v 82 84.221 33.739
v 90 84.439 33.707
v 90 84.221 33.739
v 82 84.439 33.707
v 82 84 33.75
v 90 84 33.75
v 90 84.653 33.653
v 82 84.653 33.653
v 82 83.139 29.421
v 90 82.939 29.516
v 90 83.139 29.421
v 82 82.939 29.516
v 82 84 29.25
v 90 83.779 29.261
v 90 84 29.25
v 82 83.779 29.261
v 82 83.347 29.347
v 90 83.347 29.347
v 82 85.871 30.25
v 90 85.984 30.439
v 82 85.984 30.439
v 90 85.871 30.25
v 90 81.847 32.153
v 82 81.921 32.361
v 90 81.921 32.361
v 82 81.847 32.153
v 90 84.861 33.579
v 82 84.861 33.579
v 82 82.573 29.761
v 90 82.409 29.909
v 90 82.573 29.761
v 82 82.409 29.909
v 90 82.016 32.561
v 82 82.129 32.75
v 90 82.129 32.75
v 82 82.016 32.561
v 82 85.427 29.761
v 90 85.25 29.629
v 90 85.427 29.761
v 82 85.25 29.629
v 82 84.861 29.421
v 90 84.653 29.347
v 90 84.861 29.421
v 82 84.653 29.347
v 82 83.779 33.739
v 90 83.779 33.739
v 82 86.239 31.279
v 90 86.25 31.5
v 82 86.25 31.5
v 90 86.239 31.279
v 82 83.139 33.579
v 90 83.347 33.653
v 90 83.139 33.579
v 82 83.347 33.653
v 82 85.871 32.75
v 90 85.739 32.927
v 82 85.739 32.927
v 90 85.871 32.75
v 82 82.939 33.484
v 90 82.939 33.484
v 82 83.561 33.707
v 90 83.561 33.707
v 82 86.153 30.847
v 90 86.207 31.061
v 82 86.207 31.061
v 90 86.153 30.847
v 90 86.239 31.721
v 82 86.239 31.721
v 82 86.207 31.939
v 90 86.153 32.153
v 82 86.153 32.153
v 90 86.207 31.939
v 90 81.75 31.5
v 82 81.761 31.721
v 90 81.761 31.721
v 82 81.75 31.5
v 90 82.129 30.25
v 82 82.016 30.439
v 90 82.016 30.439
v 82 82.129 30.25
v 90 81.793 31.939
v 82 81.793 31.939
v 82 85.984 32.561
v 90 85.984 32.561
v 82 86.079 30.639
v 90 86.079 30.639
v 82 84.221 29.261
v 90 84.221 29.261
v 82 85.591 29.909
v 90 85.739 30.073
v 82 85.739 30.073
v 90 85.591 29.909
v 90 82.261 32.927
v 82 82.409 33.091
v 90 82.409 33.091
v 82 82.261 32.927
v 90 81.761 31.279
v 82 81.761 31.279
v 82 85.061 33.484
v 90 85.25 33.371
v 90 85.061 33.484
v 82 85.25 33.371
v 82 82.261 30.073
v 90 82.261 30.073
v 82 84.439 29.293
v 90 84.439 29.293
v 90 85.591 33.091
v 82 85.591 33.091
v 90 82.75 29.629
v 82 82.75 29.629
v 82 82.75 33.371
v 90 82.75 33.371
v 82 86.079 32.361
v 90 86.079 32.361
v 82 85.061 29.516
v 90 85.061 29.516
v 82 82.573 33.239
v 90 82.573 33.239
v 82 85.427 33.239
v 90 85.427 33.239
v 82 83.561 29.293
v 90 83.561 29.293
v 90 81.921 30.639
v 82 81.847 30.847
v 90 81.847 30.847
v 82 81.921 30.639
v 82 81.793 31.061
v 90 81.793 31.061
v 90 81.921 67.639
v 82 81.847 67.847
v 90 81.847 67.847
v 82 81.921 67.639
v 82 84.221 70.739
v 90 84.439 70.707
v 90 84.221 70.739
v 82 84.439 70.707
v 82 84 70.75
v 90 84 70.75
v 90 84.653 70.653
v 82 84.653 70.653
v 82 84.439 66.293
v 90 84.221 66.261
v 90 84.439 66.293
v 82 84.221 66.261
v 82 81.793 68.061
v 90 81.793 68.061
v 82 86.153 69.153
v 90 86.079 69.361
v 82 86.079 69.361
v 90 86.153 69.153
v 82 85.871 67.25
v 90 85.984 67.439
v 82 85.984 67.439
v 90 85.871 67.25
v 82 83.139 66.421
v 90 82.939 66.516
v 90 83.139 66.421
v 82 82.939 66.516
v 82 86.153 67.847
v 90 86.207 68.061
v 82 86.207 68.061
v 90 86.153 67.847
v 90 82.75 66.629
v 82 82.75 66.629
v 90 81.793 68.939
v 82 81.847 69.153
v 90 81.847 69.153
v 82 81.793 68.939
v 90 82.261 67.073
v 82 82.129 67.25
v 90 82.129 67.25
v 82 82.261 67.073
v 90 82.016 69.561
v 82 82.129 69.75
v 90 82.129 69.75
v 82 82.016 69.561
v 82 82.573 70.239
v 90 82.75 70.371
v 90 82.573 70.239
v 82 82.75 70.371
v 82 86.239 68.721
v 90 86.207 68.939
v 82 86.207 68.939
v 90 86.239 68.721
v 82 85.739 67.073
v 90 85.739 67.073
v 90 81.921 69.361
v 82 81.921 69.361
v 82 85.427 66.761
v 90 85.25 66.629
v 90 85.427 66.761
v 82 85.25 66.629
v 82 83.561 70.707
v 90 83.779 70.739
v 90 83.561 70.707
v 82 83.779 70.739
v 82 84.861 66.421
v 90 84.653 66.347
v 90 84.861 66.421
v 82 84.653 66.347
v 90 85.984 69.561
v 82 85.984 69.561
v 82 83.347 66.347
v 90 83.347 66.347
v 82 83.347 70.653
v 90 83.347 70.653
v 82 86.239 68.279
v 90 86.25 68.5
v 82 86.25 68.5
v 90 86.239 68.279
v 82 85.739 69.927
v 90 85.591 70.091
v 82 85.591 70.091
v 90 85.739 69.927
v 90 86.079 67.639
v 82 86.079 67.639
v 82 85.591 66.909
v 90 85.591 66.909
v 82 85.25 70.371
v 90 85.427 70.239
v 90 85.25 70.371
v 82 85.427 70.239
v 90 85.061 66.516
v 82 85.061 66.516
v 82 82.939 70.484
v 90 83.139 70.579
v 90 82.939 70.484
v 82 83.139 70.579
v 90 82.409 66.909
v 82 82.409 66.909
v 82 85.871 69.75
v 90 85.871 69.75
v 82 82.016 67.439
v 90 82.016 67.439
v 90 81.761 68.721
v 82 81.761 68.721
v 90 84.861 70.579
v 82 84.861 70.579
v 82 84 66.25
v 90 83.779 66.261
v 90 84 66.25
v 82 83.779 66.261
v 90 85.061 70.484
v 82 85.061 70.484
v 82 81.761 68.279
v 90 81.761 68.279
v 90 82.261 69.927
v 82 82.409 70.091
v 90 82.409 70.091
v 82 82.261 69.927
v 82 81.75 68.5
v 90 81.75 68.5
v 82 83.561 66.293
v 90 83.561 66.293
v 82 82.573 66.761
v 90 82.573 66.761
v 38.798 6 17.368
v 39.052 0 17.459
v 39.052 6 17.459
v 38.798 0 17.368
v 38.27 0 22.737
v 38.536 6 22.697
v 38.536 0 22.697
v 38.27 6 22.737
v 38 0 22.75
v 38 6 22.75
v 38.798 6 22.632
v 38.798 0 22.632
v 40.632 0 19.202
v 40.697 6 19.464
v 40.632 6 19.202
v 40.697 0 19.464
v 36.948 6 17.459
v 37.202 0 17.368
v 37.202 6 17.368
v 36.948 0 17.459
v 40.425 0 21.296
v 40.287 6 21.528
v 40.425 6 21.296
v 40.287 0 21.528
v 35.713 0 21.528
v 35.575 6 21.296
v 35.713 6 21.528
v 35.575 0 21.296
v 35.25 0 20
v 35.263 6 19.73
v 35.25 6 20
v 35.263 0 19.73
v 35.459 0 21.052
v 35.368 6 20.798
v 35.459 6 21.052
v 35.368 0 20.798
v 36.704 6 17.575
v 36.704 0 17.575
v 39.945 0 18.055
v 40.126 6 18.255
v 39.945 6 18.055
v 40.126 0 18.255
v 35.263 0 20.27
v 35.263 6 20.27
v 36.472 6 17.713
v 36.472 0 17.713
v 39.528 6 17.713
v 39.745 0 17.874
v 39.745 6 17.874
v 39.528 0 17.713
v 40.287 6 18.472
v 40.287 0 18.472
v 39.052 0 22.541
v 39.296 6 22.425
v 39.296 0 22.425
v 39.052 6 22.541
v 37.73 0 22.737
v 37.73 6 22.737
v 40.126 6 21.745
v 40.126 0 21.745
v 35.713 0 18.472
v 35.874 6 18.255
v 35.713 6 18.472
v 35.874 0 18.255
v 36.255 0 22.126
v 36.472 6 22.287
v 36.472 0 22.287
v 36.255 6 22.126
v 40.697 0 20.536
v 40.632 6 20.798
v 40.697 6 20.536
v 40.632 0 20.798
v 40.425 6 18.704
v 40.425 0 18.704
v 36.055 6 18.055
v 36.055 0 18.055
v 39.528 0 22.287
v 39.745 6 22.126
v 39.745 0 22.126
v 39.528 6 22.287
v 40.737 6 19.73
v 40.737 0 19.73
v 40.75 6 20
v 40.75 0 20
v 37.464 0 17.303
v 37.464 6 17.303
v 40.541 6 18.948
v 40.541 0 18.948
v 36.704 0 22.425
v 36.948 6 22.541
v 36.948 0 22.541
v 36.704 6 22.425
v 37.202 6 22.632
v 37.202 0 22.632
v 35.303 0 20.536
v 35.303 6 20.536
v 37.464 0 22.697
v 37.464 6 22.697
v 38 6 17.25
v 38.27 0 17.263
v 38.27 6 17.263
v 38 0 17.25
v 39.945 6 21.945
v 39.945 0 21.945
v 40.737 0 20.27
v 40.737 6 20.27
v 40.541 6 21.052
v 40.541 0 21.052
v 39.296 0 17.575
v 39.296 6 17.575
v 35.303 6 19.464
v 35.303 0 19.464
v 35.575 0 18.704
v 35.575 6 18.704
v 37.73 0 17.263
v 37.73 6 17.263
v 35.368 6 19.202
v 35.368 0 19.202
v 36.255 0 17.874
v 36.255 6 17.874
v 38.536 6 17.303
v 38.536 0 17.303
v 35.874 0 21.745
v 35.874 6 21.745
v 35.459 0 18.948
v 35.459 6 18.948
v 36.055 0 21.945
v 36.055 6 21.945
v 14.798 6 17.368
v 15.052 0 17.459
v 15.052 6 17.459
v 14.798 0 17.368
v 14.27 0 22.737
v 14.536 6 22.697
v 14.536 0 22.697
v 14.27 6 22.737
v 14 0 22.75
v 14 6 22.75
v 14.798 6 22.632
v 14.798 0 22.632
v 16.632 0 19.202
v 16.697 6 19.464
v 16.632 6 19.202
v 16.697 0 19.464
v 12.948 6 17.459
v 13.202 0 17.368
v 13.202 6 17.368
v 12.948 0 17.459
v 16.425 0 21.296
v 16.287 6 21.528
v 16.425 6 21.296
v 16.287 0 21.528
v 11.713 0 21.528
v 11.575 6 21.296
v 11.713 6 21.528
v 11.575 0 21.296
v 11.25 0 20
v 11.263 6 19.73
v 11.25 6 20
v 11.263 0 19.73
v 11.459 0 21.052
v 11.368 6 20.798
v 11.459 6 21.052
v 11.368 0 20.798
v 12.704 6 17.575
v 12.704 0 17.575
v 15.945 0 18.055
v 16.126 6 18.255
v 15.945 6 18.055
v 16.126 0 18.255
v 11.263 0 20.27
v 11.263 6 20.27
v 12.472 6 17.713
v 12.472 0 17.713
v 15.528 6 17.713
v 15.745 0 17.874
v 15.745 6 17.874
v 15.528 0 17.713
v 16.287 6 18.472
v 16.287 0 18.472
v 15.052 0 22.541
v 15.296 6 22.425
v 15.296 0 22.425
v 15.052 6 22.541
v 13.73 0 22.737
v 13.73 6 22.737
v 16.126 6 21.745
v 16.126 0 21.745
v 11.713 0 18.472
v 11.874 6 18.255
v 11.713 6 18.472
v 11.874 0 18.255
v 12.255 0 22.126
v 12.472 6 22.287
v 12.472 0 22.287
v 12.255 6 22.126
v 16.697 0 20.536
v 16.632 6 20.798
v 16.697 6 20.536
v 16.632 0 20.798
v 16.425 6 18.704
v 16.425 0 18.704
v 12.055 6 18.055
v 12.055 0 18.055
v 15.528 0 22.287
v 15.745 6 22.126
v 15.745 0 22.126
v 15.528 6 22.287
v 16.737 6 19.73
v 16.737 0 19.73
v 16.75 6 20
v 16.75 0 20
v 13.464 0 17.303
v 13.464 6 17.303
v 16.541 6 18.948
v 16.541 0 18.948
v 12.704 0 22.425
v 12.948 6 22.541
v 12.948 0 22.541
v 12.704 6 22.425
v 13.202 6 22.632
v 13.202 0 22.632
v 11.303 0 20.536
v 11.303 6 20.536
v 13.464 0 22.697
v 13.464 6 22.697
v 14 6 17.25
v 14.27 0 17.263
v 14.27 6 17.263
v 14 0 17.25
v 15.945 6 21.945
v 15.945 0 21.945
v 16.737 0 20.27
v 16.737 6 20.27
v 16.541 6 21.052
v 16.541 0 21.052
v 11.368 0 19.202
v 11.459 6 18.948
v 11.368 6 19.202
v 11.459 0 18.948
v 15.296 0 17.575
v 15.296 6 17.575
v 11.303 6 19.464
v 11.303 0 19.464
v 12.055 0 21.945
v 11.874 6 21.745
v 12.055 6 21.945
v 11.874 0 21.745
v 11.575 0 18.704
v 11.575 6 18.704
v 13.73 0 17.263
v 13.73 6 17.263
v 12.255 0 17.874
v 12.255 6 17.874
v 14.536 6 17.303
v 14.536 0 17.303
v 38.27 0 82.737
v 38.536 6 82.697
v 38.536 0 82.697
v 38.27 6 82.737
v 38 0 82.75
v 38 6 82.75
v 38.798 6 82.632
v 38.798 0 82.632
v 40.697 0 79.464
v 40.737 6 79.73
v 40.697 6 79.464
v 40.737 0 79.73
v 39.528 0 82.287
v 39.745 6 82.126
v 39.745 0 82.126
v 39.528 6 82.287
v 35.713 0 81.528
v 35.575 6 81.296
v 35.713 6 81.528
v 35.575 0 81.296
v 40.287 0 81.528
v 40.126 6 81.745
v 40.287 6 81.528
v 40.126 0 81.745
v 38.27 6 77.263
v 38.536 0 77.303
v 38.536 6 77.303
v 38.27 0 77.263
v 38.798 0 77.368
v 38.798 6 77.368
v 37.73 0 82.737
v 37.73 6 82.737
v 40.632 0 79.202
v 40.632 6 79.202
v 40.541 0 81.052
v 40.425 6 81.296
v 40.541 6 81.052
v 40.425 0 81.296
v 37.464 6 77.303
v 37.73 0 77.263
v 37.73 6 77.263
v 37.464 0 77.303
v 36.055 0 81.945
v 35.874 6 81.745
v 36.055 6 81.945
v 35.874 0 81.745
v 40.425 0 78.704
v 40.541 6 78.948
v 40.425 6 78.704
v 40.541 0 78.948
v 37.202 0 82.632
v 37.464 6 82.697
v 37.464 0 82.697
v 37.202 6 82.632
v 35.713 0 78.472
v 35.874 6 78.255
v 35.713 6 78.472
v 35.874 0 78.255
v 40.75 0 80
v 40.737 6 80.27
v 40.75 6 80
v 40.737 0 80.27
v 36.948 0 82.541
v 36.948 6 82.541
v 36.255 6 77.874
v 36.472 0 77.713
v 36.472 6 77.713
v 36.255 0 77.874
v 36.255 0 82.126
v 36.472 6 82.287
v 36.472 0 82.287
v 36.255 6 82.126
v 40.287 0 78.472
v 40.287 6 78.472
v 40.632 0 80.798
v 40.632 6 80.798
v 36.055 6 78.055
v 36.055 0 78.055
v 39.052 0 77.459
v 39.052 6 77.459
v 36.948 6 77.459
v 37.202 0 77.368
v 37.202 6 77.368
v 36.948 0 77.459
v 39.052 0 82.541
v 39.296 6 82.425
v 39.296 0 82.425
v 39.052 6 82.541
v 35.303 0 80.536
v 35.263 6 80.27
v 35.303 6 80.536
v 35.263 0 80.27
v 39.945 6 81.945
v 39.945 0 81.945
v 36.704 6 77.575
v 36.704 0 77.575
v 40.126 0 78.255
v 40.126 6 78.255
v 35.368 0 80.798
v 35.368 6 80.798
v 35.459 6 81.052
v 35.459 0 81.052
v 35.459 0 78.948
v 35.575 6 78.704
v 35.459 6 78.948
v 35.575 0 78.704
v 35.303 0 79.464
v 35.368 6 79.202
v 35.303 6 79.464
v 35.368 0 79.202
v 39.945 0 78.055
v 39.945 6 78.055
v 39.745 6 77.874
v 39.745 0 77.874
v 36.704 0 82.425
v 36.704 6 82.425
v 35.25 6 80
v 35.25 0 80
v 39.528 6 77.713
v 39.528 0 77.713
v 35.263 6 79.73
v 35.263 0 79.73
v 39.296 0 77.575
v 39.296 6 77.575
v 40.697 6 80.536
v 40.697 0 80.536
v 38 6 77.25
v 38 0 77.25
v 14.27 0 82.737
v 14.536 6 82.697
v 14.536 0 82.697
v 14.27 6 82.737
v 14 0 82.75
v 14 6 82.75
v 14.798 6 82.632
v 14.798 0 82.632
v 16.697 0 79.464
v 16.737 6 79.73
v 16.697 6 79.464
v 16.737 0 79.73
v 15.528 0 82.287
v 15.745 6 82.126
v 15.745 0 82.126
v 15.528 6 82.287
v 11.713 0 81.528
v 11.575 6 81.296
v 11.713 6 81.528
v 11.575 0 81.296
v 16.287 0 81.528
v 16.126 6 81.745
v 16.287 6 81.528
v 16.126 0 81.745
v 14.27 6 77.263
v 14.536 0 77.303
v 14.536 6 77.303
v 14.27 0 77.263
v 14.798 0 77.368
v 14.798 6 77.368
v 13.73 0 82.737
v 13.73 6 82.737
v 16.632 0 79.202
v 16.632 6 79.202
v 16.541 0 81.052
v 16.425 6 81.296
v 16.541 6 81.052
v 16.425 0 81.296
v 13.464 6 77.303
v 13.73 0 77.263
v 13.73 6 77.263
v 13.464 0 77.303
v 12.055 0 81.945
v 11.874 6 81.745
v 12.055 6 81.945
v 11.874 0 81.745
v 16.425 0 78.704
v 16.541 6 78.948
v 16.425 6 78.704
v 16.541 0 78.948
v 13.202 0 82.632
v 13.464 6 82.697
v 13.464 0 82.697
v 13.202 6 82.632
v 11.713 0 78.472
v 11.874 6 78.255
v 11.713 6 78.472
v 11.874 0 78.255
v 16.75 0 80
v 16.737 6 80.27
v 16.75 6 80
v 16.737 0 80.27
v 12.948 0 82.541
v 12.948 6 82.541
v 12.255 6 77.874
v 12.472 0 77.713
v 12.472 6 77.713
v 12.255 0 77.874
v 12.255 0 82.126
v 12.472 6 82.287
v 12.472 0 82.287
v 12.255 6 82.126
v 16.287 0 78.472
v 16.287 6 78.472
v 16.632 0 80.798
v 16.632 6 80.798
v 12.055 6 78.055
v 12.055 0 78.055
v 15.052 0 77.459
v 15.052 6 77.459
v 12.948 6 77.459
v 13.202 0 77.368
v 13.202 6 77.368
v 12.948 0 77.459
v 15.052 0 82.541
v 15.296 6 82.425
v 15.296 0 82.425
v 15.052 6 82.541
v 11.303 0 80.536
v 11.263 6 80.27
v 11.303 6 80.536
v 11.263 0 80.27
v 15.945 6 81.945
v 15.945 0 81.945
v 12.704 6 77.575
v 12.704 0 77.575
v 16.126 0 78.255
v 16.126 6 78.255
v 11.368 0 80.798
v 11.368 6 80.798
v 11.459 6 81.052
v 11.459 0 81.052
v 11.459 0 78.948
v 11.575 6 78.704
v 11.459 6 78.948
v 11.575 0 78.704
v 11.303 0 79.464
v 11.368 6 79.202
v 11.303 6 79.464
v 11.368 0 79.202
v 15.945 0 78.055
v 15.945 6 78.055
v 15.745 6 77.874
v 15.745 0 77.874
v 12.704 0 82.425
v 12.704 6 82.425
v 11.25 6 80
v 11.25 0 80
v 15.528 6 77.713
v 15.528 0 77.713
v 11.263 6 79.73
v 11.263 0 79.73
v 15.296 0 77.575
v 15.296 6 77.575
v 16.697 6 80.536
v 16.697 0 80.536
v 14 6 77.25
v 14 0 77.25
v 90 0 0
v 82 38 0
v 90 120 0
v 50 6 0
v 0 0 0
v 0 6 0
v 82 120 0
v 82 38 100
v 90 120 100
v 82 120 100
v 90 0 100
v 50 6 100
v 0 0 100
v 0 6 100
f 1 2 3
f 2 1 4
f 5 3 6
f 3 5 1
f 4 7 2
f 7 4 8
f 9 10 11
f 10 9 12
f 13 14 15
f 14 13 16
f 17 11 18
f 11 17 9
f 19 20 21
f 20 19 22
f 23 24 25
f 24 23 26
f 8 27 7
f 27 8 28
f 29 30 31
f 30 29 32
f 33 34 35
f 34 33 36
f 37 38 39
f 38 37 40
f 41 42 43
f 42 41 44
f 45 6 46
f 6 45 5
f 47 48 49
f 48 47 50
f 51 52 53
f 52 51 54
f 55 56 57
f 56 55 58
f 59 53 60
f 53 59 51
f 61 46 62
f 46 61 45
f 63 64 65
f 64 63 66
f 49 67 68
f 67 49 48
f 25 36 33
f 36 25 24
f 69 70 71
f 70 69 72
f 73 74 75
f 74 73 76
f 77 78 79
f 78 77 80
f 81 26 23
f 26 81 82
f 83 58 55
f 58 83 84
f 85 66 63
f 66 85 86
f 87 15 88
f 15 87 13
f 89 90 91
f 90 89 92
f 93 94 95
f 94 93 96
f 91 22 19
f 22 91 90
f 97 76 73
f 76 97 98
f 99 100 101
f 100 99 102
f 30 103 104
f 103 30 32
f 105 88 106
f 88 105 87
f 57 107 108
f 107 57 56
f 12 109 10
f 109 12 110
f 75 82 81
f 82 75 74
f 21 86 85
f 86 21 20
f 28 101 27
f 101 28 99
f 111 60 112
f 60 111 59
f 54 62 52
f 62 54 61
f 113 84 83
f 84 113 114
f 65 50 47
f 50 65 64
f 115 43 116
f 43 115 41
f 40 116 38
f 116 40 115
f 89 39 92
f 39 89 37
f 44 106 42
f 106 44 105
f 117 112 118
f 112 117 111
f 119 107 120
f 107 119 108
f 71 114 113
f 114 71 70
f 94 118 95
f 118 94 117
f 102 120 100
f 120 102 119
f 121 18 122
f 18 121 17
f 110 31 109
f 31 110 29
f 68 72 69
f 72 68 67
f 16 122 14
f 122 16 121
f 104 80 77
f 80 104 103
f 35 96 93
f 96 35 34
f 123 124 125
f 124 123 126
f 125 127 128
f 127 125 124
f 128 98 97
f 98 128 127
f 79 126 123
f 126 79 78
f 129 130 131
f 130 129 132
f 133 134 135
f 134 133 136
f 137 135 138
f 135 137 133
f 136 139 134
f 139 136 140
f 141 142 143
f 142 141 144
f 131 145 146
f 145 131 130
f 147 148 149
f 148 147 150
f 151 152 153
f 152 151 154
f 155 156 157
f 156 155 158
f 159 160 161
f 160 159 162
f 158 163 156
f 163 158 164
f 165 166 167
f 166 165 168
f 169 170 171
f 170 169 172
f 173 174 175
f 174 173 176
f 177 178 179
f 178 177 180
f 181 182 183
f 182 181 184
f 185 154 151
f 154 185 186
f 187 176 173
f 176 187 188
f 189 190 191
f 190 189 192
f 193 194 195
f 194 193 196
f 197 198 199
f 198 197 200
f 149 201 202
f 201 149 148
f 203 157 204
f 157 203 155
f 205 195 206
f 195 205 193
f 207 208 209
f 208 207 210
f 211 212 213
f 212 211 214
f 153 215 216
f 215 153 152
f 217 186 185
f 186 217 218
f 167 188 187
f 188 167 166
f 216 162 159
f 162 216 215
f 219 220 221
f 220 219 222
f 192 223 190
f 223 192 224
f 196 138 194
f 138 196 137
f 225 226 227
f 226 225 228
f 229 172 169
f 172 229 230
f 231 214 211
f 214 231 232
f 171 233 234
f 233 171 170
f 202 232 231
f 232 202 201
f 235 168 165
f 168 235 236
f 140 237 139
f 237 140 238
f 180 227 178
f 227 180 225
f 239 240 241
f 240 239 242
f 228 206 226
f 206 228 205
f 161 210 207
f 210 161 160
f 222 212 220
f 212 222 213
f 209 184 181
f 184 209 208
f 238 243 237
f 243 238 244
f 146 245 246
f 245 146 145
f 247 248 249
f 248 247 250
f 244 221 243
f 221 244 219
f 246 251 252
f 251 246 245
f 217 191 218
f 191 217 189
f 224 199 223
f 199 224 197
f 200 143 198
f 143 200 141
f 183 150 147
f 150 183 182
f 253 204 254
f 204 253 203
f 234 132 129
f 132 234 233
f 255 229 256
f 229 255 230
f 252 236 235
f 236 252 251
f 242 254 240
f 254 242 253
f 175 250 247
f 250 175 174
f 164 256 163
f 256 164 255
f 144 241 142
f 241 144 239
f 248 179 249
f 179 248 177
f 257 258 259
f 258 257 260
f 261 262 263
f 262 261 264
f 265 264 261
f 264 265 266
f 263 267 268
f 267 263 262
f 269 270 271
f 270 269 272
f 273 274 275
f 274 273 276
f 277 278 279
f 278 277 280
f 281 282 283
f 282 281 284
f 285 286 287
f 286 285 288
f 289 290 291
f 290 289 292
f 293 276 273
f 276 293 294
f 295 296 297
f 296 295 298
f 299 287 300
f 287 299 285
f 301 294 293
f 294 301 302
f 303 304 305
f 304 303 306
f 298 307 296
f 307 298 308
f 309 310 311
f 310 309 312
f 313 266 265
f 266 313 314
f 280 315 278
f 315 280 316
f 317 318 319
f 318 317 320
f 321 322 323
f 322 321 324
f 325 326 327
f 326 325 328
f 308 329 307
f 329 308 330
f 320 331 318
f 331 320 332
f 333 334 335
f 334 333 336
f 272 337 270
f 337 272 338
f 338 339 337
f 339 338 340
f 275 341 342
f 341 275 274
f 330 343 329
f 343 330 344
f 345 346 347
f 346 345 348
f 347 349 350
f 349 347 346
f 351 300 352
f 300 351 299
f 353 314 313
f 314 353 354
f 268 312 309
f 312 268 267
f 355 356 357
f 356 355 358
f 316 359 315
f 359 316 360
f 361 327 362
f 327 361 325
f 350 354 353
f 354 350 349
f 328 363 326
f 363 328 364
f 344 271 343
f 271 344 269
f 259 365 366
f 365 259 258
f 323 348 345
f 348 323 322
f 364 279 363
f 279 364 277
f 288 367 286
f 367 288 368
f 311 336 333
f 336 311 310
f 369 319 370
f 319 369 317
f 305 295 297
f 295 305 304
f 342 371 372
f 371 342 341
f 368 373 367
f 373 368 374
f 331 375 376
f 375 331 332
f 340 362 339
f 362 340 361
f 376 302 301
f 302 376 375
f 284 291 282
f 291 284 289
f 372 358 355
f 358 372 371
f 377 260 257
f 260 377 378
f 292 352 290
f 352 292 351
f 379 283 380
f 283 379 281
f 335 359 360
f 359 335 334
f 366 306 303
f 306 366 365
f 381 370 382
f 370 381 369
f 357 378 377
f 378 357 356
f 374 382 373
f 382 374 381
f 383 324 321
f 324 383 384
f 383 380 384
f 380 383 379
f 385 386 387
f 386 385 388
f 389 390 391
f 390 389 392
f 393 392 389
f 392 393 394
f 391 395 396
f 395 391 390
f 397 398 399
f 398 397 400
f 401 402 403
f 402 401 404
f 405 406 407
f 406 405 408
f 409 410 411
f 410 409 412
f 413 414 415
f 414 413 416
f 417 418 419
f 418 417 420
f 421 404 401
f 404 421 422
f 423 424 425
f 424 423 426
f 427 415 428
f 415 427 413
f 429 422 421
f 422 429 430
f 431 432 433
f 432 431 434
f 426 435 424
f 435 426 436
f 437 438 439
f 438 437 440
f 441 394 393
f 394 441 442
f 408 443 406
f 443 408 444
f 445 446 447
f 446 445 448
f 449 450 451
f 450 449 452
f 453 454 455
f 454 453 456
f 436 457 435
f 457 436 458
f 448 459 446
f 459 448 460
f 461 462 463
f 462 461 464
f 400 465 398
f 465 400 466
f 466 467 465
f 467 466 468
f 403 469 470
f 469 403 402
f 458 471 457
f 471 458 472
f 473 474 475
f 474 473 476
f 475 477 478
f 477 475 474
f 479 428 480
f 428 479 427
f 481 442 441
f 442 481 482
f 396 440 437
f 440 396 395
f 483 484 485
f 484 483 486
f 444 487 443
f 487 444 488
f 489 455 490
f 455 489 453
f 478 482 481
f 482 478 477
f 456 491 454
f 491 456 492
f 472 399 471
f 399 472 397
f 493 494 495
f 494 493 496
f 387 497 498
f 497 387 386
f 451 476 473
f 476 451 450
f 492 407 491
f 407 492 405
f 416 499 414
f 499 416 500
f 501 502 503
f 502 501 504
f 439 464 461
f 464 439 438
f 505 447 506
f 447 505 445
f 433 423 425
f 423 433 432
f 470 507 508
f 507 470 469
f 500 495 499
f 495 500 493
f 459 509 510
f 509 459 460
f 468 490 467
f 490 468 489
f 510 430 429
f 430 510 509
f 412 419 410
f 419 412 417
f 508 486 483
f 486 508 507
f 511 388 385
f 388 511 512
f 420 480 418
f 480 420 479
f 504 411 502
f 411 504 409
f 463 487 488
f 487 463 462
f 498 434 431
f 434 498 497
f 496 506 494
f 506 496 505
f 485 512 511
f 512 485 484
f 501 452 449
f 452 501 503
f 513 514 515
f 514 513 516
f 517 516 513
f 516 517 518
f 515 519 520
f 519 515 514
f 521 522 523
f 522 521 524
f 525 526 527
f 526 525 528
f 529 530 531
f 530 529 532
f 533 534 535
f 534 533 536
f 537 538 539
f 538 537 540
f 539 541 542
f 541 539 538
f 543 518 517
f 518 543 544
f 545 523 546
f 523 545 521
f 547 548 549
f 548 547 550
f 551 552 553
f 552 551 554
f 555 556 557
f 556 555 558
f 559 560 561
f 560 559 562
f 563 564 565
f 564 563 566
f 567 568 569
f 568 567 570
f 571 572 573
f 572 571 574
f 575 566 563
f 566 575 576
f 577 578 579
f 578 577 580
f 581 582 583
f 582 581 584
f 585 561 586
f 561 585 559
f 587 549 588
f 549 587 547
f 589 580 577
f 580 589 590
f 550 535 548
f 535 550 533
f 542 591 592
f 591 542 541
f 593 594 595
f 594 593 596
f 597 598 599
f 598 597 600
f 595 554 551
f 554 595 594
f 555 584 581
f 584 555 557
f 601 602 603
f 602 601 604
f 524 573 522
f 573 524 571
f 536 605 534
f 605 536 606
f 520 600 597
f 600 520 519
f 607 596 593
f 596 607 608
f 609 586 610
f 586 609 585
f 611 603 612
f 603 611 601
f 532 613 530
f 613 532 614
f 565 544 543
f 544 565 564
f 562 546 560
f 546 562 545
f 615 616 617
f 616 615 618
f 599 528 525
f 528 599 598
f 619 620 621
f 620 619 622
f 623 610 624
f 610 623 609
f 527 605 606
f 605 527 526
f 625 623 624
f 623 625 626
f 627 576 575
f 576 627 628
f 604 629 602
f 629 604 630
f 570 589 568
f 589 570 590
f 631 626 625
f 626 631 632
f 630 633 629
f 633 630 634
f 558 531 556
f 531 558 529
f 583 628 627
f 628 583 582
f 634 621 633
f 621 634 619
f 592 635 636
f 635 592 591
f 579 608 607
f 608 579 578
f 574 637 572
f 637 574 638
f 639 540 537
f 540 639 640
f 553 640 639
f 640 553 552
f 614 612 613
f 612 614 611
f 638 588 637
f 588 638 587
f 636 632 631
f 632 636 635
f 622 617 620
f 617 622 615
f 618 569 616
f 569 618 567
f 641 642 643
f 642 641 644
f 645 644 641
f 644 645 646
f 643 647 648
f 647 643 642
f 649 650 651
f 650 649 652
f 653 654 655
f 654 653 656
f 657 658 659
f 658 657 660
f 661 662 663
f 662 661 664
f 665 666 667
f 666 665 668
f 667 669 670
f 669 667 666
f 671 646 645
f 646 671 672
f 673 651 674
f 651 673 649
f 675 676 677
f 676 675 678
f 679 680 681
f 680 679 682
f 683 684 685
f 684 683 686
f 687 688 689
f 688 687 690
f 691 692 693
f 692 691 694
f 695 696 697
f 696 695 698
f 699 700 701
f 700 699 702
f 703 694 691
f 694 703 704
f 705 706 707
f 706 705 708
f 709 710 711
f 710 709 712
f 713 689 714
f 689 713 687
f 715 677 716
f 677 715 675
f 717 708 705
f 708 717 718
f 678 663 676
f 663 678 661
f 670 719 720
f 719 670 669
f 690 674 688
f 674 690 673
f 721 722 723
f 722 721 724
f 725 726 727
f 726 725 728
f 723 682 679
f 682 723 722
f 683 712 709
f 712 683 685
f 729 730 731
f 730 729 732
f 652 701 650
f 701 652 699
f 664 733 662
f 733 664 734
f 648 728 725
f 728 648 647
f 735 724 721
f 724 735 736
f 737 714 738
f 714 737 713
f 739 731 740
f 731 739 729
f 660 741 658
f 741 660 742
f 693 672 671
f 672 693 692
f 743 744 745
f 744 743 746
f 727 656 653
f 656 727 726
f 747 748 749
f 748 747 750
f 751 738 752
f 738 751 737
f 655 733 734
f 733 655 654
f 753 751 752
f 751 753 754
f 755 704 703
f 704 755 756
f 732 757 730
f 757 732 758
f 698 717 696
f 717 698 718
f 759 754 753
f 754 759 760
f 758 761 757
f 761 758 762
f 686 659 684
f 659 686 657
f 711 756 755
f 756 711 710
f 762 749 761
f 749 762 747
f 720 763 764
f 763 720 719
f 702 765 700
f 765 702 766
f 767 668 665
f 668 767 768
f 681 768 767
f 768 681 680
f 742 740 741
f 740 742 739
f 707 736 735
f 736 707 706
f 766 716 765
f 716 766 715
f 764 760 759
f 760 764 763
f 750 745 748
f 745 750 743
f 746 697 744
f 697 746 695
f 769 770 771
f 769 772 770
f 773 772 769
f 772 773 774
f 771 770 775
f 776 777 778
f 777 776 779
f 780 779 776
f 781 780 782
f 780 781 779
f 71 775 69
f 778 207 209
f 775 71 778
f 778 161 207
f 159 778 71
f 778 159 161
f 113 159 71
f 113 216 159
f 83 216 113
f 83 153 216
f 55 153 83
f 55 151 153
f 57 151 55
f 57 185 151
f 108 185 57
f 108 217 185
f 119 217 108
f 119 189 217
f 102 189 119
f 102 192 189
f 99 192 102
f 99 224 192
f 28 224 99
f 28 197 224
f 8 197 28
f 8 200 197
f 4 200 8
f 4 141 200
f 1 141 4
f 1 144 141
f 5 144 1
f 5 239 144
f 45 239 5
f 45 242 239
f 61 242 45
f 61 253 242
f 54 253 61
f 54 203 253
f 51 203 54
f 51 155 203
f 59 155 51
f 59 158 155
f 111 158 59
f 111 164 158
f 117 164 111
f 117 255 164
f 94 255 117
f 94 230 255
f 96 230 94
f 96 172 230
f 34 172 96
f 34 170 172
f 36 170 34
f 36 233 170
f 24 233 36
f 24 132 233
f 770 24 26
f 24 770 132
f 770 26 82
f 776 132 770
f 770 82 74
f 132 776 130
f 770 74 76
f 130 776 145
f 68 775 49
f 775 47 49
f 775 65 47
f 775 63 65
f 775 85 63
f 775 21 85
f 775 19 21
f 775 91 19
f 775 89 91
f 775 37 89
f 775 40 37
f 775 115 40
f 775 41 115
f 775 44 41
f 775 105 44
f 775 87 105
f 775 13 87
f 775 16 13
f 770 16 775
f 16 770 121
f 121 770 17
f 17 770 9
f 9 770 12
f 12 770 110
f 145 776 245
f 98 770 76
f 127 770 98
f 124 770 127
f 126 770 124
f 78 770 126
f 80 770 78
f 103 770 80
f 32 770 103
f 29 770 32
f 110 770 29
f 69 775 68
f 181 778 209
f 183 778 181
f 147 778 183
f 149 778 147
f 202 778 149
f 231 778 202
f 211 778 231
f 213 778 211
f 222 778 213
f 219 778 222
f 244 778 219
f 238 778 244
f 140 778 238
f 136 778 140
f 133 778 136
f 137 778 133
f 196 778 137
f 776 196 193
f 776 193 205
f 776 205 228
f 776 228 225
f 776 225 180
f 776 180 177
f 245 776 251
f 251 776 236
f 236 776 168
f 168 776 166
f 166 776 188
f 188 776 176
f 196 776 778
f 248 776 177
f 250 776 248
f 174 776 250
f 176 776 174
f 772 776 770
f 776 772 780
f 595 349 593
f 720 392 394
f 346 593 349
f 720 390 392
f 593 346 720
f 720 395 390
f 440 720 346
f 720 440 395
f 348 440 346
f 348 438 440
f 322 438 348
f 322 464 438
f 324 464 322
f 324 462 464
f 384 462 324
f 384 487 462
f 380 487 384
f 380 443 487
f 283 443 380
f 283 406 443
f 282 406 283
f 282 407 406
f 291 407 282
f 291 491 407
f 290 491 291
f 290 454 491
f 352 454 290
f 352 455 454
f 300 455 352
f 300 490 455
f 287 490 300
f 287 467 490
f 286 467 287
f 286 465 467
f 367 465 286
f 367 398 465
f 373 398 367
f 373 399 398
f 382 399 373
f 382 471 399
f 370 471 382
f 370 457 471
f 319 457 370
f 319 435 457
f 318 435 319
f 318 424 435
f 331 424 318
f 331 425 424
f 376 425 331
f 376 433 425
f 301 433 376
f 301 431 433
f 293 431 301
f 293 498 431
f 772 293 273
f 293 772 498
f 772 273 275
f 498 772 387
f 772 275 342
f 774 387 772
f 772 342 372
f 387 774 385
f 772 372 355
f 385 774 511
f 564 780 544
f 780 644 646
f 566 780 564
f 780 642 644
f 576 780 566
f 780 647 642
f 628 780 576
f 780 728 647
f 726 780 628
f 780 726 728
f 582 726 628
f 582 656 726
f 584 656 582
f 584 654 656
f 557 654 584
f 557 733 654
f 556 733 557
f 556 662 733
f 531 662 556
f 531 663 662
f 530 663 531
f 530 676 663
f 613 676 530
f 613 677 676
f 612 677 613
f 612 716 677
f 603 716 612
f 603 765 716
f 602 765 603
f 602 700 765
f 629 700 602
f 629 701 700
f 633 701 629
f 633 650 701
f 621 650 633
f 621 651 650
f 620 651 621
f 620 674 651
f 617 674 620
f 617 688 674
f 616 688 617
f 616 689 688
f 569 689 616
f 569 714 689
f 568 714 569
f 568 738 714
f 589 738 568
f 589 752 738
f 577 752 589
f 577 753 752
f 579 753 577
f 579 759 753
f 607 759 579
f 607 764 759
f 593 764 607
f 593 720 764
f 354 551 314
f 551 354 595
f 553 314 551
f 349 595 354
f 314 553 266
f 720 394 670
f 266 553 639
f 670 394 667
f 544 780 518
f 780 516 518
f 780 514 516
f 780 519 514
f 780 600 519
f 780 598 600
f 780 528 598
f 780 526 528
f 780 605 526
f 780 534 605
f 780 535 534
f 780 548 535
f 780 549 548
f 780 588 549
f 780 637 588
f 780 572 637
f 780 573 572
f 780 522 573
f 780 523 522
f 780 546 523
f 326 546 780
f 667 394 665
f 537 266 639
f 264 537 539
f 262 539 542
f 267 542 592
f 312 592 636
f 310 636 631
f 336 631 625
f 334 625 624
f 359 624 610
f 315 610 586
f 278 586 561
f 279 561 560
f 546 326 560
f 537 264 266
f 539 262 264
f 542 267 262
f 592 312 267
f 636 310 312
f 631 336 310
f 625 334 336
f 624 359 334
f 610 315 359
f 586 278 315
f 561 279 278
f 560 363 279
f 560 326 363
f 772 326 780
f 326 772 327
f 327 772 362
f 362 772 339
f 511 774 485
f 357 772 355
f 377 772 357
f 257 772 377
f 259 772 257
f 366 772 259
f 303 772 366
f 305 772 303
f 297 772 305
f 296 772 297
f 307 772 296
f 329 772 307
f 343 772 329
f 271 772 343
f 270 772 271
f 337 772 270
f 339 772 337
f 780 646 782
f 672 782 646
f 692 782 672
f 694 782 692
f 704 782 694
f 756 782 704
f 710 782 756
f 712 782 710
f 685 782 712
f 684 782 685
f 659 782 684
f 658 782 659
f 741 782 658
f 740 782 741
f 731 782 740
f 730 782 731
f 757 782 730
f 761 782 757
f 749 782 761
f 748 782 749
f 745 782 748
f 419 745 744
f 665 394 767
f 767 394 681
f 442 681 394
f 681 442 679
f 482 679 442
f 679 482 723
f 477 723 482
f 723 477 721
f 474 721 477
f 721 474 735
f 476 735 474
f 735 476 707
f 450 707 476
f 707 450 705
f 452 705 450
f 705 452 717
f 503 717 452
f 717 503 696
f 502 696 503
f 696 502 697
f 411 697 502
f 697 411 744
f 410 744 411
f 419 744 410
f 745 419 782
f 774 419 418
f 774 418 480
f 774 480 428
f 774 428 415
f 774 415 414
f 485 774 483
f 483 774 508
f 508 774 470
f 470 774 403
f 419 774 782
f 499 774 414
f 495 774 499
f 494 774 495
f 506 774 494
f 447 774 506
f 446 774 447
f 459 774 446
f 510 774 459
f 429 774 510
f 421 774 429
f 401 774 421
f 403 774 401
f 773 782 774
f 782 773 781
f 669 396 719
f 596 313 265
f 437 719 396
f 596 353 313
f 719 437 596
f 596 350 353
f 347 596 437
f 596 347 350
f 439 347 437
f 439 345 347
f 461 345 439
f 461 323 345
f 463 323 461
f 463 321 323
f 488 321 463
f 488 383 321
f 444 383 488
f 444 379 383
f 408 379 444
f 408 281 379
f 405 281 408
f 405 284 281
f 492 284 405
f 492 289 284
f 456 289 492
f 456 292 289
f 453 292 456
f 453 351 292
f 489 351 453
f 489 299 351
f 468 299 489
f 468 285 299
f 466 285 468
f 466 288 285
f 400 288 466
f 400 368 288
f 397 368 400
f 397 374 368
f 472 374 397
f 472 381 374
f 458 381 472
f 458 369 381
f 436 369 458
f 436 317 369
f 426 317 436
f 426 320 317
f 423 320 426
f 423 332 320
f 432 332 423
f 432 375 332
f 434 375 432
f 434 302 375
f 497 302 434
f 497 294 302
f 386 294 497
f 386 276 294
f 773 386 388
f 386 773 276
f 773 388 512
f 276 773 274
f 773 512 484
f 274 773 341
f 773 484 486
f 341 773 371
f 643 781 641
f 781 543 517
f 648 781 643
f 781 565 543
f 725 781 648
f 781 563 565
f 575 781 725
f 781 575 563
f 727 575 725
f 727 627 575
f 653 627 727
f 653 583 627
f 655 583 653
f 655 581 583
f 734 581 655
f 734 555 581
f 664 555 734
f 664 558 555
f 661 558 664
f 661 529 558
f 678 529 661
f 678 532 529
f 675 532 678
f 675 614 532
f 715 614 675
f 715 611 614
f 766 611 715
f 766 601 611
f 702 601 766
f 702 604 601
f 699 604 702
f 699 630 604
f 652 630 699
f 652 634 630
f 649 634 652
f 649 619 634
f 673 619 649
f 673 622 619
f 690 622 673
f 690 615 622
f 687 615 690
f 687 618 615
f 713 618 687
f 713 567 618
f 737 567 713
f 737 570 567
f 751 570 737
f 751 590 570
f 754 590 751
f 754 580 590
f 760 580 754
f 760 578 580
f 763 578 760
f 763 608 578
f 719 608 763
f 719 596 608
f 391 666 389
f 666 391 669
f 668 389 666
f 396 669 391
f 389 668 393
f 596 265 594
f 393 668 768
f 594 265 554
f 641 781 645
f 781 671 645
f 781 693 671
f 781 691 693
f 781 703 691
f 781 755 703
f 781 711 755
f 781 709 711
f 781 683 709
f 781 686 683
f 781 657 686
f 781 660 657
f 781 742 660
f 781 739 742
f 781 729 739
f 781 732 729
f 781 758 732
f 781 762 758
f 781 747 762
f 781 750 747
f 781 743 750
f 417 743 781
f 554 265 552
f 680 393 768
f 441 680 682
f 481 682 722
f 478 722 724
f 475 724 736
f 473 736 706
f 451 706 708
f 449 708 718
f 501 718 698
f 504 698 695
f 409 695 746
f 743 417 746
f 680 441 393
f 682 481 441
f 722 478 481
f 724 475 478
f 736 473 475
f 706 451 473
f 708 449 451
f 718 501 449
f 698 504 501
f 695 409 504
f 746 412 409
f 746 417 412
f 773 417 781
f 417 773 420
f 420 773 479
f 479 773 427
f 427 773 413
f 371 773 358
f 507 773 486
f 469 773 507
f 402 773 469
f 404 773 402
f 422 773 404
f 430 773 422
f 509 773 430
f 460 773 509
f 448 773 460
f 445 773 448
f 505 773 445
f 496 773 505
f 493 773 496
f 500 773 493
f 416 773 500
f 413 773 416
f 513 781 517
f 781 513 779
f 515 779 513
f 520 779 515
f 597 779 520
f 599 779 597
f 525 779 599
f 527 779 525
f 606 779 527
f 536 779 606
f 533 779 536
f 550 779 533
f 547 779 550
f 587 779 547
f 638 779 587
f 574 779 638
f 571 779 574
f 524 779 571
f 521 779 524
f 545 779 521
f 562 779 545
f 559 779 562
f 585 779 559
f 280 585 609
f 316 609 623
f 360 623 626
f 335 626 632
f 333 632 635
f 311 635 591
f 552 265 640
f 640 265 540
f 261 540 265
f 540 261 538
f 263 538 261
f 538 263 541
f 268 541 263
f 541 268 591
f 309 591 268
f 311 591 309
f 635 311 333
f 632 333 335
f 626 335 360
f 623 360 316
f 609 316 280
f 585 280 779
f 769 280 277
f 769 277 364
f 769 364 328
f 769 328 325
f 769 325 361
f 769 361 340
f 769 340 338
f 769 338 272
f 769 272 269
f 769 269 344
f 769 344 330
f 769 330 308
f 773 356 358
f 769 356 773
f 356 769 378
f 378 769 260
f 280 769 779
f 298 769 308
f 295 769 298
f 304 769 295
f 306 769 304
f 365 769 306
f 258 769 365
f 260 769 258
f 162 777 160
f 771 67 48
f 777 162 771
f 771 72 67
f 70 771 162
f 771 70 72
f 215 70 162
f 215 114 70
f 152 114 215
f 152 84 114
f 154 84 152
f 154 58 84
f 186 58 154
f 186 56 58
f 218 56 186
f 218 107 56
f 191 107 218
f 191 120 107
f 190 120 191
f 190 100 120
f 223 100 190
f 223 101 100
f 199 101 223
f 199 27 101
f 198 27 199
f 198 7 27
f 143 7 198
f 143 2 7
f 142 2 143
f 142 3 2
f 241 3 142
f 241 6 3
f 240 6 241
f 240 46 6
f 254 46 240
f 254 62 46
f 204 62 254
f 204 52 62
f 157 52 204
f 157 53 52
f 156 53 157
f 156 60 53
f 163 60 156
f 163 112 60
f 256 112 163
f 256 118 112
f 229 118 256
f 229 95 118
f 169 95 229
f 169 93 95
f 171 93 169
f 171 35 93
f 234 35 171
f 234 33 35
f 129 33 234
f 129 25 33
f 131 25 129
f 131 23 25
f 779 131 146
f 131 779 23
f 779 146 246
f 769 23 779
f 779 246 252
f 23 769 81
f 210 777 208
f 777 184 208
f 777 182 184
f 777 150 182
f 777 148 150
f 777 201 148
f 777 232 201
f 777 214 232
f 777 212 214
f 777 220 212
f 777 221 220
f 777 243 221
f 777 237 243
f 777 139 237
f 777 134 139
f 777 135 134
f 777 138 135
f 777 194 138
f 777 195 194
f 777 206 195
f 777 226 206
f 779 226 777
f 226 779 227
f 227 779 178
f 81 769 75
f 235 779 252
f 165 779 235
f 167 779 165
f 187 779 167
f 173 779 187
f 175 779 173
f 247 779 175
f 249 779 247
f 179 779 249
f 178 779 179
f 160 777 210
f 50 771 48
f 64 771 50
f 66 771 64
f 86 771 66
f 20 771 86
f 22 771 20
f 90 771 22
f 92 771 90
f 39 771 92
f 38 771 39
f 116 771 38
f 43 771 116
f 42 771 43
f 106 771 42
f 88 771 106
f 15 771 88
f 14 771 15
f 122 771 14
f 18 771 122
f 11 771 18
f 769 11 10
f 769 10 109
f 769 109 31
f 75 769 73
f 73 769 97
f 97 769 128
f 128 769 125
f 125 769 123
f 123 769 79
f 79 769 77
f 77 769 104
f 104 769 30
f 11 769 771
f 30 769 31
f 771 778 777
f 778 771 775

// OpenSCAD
/* Eufy C220 / T8W11 inverted wall bracket. Dimensions in mm. */

/* [Output] */
part = "bracket"; // [bracket, assembled]

/* [Bracket] */
width = 100;
projection = 120;
wall_height = 90;
wall_thickness = 6;
arm_thickness = 8;
reinforcement_run = 32;
reinforcement_rise = 32;

/* [Camera mounting plate] */
camera_hole_spacing = 37;
camera_hole_diameter = 4.5;
camera_mount_offset = 84;
camera_hardware_diameter = 12;

/* [Wall fasteners] */
wall_hole_diameter = 5.5;
wall_hole_spacing = 60;
wall_hole_lower = 52;
wall_hole_upper = 76;
wall_hardware_diameter = 12;

/* [Hidden] */
$fn = 64;
epsilon = 0.02;
minimum_edge = 4;

assert(part == "bracket" || part == "assembled", "Unknown part.");
assert(width > 0 && projection > 0 && wall_height > 0);
assert(wall_thickness >= 4 && arm_thickness >= 6);
assert(reinforcement_run > 0 && reinforcement_rise > 0);
assert(wall_thickness + reinforcement_run < projection);
assert(arm_thickness + reinforcement_rise < wall_height);
assert(camera_hole_diameter > 0 && wall_hole_diameter > 0);
assert(camera_hardware_diameter > camera_hole_diameter);
assert(wall_hardware_diameter > wall_hole_diameter);
assert(camera_hole_spacing > camera_hardware_diameter);
assert(camera_hole_spacing / 2 + camera_hardware_diameter / 2
       + minimum_edge <= width / 2, "Camera hardware exceeds arm width.");
assert(camera_mount_offset - camera_hardware_diameter / 2
       >= wall_thickness + reinforcement_run + minimum_edge,
       "Camera hardware would touch the reinforcement.");
assert(camera_mount_offset + camera_hardware_diameter / 2
       + minimum_edge <= projection, "Camera holes too close to arm tip.");
assert(wall_hole_spacing > wall_hardware_diameter);
assert(wall_hole_spacing / 2 + wall_hardware_diameter / 2
       + minimum_edge <= width / 2, "Wall hardware exceeds backplate width.");
assert(wall_hole_lower - wall_hardware_diameter / 2
       >= arm_thickness + reinforcement_rise + minimum_edge,
       "Wall hardware would touch the reinforcement.");
assert(wall_hole_upper - wall_hole_lower
       >= wall_hardware_diameter + minimum_edge);
assert(wall_hole_upper + wall_hardware_diameter / 2
       + minimum_edge <= wall_height, "Wall holes too close to top edge.");

module blank() {
    // Extrude one continuous L-section: the upper fillet leaves the underside flat.
    translate([-width / 2, 0, 0])
        multmatrix([
            [0, 0, 1, 0],
            [1, 0, 0, 0],
            [0, 1, 0, 0],
            [0, 0, 0, 1]
        ])
            linear_extrude(height = width, convexity = 4)
                polygon([
                    [0, 0],
                    [projection, 0],
                    [projection, arm_thickness],
                    [wall_thickness + reinforcement_run, arm_thickness],
                    [wall_thickness, arm_thickness + reinforcement_rise],
                    [wall_thickness, wall_height],
                    [0, wall_height]
                ]);
}

module installed_bracket() {
    difference() {
        blank();
        for (x = [-camera_hole_spacing / 2, camera_hole_spacing / 2])
            translate([x, camera_mount_offset, -epsilon])
                cylinder(d = camera_hole_diameter,
                         h = arm_thickness + 2 * epsilon);

        for (x = [-wall_hole_spacing / 2, wall_hole_spacing / 2])
            for (z = [wall_hole_lower, wall_hole_upper])
                translate([x, -epsilon, z])
                    rotate([-90, 0, 0])
                        cylinder(d = wall_hole_diameter,
                                 h = wall_thickness + 2 * epsilon);
    }
}

if (part == "assembled")
    installed_bracket();
else
    // Print on an end face so each layer contains the complete reinforced L.
    translate([wall_height, 0, width / 2])
        rotate([0, -90, 0])
            installed_bracket();
